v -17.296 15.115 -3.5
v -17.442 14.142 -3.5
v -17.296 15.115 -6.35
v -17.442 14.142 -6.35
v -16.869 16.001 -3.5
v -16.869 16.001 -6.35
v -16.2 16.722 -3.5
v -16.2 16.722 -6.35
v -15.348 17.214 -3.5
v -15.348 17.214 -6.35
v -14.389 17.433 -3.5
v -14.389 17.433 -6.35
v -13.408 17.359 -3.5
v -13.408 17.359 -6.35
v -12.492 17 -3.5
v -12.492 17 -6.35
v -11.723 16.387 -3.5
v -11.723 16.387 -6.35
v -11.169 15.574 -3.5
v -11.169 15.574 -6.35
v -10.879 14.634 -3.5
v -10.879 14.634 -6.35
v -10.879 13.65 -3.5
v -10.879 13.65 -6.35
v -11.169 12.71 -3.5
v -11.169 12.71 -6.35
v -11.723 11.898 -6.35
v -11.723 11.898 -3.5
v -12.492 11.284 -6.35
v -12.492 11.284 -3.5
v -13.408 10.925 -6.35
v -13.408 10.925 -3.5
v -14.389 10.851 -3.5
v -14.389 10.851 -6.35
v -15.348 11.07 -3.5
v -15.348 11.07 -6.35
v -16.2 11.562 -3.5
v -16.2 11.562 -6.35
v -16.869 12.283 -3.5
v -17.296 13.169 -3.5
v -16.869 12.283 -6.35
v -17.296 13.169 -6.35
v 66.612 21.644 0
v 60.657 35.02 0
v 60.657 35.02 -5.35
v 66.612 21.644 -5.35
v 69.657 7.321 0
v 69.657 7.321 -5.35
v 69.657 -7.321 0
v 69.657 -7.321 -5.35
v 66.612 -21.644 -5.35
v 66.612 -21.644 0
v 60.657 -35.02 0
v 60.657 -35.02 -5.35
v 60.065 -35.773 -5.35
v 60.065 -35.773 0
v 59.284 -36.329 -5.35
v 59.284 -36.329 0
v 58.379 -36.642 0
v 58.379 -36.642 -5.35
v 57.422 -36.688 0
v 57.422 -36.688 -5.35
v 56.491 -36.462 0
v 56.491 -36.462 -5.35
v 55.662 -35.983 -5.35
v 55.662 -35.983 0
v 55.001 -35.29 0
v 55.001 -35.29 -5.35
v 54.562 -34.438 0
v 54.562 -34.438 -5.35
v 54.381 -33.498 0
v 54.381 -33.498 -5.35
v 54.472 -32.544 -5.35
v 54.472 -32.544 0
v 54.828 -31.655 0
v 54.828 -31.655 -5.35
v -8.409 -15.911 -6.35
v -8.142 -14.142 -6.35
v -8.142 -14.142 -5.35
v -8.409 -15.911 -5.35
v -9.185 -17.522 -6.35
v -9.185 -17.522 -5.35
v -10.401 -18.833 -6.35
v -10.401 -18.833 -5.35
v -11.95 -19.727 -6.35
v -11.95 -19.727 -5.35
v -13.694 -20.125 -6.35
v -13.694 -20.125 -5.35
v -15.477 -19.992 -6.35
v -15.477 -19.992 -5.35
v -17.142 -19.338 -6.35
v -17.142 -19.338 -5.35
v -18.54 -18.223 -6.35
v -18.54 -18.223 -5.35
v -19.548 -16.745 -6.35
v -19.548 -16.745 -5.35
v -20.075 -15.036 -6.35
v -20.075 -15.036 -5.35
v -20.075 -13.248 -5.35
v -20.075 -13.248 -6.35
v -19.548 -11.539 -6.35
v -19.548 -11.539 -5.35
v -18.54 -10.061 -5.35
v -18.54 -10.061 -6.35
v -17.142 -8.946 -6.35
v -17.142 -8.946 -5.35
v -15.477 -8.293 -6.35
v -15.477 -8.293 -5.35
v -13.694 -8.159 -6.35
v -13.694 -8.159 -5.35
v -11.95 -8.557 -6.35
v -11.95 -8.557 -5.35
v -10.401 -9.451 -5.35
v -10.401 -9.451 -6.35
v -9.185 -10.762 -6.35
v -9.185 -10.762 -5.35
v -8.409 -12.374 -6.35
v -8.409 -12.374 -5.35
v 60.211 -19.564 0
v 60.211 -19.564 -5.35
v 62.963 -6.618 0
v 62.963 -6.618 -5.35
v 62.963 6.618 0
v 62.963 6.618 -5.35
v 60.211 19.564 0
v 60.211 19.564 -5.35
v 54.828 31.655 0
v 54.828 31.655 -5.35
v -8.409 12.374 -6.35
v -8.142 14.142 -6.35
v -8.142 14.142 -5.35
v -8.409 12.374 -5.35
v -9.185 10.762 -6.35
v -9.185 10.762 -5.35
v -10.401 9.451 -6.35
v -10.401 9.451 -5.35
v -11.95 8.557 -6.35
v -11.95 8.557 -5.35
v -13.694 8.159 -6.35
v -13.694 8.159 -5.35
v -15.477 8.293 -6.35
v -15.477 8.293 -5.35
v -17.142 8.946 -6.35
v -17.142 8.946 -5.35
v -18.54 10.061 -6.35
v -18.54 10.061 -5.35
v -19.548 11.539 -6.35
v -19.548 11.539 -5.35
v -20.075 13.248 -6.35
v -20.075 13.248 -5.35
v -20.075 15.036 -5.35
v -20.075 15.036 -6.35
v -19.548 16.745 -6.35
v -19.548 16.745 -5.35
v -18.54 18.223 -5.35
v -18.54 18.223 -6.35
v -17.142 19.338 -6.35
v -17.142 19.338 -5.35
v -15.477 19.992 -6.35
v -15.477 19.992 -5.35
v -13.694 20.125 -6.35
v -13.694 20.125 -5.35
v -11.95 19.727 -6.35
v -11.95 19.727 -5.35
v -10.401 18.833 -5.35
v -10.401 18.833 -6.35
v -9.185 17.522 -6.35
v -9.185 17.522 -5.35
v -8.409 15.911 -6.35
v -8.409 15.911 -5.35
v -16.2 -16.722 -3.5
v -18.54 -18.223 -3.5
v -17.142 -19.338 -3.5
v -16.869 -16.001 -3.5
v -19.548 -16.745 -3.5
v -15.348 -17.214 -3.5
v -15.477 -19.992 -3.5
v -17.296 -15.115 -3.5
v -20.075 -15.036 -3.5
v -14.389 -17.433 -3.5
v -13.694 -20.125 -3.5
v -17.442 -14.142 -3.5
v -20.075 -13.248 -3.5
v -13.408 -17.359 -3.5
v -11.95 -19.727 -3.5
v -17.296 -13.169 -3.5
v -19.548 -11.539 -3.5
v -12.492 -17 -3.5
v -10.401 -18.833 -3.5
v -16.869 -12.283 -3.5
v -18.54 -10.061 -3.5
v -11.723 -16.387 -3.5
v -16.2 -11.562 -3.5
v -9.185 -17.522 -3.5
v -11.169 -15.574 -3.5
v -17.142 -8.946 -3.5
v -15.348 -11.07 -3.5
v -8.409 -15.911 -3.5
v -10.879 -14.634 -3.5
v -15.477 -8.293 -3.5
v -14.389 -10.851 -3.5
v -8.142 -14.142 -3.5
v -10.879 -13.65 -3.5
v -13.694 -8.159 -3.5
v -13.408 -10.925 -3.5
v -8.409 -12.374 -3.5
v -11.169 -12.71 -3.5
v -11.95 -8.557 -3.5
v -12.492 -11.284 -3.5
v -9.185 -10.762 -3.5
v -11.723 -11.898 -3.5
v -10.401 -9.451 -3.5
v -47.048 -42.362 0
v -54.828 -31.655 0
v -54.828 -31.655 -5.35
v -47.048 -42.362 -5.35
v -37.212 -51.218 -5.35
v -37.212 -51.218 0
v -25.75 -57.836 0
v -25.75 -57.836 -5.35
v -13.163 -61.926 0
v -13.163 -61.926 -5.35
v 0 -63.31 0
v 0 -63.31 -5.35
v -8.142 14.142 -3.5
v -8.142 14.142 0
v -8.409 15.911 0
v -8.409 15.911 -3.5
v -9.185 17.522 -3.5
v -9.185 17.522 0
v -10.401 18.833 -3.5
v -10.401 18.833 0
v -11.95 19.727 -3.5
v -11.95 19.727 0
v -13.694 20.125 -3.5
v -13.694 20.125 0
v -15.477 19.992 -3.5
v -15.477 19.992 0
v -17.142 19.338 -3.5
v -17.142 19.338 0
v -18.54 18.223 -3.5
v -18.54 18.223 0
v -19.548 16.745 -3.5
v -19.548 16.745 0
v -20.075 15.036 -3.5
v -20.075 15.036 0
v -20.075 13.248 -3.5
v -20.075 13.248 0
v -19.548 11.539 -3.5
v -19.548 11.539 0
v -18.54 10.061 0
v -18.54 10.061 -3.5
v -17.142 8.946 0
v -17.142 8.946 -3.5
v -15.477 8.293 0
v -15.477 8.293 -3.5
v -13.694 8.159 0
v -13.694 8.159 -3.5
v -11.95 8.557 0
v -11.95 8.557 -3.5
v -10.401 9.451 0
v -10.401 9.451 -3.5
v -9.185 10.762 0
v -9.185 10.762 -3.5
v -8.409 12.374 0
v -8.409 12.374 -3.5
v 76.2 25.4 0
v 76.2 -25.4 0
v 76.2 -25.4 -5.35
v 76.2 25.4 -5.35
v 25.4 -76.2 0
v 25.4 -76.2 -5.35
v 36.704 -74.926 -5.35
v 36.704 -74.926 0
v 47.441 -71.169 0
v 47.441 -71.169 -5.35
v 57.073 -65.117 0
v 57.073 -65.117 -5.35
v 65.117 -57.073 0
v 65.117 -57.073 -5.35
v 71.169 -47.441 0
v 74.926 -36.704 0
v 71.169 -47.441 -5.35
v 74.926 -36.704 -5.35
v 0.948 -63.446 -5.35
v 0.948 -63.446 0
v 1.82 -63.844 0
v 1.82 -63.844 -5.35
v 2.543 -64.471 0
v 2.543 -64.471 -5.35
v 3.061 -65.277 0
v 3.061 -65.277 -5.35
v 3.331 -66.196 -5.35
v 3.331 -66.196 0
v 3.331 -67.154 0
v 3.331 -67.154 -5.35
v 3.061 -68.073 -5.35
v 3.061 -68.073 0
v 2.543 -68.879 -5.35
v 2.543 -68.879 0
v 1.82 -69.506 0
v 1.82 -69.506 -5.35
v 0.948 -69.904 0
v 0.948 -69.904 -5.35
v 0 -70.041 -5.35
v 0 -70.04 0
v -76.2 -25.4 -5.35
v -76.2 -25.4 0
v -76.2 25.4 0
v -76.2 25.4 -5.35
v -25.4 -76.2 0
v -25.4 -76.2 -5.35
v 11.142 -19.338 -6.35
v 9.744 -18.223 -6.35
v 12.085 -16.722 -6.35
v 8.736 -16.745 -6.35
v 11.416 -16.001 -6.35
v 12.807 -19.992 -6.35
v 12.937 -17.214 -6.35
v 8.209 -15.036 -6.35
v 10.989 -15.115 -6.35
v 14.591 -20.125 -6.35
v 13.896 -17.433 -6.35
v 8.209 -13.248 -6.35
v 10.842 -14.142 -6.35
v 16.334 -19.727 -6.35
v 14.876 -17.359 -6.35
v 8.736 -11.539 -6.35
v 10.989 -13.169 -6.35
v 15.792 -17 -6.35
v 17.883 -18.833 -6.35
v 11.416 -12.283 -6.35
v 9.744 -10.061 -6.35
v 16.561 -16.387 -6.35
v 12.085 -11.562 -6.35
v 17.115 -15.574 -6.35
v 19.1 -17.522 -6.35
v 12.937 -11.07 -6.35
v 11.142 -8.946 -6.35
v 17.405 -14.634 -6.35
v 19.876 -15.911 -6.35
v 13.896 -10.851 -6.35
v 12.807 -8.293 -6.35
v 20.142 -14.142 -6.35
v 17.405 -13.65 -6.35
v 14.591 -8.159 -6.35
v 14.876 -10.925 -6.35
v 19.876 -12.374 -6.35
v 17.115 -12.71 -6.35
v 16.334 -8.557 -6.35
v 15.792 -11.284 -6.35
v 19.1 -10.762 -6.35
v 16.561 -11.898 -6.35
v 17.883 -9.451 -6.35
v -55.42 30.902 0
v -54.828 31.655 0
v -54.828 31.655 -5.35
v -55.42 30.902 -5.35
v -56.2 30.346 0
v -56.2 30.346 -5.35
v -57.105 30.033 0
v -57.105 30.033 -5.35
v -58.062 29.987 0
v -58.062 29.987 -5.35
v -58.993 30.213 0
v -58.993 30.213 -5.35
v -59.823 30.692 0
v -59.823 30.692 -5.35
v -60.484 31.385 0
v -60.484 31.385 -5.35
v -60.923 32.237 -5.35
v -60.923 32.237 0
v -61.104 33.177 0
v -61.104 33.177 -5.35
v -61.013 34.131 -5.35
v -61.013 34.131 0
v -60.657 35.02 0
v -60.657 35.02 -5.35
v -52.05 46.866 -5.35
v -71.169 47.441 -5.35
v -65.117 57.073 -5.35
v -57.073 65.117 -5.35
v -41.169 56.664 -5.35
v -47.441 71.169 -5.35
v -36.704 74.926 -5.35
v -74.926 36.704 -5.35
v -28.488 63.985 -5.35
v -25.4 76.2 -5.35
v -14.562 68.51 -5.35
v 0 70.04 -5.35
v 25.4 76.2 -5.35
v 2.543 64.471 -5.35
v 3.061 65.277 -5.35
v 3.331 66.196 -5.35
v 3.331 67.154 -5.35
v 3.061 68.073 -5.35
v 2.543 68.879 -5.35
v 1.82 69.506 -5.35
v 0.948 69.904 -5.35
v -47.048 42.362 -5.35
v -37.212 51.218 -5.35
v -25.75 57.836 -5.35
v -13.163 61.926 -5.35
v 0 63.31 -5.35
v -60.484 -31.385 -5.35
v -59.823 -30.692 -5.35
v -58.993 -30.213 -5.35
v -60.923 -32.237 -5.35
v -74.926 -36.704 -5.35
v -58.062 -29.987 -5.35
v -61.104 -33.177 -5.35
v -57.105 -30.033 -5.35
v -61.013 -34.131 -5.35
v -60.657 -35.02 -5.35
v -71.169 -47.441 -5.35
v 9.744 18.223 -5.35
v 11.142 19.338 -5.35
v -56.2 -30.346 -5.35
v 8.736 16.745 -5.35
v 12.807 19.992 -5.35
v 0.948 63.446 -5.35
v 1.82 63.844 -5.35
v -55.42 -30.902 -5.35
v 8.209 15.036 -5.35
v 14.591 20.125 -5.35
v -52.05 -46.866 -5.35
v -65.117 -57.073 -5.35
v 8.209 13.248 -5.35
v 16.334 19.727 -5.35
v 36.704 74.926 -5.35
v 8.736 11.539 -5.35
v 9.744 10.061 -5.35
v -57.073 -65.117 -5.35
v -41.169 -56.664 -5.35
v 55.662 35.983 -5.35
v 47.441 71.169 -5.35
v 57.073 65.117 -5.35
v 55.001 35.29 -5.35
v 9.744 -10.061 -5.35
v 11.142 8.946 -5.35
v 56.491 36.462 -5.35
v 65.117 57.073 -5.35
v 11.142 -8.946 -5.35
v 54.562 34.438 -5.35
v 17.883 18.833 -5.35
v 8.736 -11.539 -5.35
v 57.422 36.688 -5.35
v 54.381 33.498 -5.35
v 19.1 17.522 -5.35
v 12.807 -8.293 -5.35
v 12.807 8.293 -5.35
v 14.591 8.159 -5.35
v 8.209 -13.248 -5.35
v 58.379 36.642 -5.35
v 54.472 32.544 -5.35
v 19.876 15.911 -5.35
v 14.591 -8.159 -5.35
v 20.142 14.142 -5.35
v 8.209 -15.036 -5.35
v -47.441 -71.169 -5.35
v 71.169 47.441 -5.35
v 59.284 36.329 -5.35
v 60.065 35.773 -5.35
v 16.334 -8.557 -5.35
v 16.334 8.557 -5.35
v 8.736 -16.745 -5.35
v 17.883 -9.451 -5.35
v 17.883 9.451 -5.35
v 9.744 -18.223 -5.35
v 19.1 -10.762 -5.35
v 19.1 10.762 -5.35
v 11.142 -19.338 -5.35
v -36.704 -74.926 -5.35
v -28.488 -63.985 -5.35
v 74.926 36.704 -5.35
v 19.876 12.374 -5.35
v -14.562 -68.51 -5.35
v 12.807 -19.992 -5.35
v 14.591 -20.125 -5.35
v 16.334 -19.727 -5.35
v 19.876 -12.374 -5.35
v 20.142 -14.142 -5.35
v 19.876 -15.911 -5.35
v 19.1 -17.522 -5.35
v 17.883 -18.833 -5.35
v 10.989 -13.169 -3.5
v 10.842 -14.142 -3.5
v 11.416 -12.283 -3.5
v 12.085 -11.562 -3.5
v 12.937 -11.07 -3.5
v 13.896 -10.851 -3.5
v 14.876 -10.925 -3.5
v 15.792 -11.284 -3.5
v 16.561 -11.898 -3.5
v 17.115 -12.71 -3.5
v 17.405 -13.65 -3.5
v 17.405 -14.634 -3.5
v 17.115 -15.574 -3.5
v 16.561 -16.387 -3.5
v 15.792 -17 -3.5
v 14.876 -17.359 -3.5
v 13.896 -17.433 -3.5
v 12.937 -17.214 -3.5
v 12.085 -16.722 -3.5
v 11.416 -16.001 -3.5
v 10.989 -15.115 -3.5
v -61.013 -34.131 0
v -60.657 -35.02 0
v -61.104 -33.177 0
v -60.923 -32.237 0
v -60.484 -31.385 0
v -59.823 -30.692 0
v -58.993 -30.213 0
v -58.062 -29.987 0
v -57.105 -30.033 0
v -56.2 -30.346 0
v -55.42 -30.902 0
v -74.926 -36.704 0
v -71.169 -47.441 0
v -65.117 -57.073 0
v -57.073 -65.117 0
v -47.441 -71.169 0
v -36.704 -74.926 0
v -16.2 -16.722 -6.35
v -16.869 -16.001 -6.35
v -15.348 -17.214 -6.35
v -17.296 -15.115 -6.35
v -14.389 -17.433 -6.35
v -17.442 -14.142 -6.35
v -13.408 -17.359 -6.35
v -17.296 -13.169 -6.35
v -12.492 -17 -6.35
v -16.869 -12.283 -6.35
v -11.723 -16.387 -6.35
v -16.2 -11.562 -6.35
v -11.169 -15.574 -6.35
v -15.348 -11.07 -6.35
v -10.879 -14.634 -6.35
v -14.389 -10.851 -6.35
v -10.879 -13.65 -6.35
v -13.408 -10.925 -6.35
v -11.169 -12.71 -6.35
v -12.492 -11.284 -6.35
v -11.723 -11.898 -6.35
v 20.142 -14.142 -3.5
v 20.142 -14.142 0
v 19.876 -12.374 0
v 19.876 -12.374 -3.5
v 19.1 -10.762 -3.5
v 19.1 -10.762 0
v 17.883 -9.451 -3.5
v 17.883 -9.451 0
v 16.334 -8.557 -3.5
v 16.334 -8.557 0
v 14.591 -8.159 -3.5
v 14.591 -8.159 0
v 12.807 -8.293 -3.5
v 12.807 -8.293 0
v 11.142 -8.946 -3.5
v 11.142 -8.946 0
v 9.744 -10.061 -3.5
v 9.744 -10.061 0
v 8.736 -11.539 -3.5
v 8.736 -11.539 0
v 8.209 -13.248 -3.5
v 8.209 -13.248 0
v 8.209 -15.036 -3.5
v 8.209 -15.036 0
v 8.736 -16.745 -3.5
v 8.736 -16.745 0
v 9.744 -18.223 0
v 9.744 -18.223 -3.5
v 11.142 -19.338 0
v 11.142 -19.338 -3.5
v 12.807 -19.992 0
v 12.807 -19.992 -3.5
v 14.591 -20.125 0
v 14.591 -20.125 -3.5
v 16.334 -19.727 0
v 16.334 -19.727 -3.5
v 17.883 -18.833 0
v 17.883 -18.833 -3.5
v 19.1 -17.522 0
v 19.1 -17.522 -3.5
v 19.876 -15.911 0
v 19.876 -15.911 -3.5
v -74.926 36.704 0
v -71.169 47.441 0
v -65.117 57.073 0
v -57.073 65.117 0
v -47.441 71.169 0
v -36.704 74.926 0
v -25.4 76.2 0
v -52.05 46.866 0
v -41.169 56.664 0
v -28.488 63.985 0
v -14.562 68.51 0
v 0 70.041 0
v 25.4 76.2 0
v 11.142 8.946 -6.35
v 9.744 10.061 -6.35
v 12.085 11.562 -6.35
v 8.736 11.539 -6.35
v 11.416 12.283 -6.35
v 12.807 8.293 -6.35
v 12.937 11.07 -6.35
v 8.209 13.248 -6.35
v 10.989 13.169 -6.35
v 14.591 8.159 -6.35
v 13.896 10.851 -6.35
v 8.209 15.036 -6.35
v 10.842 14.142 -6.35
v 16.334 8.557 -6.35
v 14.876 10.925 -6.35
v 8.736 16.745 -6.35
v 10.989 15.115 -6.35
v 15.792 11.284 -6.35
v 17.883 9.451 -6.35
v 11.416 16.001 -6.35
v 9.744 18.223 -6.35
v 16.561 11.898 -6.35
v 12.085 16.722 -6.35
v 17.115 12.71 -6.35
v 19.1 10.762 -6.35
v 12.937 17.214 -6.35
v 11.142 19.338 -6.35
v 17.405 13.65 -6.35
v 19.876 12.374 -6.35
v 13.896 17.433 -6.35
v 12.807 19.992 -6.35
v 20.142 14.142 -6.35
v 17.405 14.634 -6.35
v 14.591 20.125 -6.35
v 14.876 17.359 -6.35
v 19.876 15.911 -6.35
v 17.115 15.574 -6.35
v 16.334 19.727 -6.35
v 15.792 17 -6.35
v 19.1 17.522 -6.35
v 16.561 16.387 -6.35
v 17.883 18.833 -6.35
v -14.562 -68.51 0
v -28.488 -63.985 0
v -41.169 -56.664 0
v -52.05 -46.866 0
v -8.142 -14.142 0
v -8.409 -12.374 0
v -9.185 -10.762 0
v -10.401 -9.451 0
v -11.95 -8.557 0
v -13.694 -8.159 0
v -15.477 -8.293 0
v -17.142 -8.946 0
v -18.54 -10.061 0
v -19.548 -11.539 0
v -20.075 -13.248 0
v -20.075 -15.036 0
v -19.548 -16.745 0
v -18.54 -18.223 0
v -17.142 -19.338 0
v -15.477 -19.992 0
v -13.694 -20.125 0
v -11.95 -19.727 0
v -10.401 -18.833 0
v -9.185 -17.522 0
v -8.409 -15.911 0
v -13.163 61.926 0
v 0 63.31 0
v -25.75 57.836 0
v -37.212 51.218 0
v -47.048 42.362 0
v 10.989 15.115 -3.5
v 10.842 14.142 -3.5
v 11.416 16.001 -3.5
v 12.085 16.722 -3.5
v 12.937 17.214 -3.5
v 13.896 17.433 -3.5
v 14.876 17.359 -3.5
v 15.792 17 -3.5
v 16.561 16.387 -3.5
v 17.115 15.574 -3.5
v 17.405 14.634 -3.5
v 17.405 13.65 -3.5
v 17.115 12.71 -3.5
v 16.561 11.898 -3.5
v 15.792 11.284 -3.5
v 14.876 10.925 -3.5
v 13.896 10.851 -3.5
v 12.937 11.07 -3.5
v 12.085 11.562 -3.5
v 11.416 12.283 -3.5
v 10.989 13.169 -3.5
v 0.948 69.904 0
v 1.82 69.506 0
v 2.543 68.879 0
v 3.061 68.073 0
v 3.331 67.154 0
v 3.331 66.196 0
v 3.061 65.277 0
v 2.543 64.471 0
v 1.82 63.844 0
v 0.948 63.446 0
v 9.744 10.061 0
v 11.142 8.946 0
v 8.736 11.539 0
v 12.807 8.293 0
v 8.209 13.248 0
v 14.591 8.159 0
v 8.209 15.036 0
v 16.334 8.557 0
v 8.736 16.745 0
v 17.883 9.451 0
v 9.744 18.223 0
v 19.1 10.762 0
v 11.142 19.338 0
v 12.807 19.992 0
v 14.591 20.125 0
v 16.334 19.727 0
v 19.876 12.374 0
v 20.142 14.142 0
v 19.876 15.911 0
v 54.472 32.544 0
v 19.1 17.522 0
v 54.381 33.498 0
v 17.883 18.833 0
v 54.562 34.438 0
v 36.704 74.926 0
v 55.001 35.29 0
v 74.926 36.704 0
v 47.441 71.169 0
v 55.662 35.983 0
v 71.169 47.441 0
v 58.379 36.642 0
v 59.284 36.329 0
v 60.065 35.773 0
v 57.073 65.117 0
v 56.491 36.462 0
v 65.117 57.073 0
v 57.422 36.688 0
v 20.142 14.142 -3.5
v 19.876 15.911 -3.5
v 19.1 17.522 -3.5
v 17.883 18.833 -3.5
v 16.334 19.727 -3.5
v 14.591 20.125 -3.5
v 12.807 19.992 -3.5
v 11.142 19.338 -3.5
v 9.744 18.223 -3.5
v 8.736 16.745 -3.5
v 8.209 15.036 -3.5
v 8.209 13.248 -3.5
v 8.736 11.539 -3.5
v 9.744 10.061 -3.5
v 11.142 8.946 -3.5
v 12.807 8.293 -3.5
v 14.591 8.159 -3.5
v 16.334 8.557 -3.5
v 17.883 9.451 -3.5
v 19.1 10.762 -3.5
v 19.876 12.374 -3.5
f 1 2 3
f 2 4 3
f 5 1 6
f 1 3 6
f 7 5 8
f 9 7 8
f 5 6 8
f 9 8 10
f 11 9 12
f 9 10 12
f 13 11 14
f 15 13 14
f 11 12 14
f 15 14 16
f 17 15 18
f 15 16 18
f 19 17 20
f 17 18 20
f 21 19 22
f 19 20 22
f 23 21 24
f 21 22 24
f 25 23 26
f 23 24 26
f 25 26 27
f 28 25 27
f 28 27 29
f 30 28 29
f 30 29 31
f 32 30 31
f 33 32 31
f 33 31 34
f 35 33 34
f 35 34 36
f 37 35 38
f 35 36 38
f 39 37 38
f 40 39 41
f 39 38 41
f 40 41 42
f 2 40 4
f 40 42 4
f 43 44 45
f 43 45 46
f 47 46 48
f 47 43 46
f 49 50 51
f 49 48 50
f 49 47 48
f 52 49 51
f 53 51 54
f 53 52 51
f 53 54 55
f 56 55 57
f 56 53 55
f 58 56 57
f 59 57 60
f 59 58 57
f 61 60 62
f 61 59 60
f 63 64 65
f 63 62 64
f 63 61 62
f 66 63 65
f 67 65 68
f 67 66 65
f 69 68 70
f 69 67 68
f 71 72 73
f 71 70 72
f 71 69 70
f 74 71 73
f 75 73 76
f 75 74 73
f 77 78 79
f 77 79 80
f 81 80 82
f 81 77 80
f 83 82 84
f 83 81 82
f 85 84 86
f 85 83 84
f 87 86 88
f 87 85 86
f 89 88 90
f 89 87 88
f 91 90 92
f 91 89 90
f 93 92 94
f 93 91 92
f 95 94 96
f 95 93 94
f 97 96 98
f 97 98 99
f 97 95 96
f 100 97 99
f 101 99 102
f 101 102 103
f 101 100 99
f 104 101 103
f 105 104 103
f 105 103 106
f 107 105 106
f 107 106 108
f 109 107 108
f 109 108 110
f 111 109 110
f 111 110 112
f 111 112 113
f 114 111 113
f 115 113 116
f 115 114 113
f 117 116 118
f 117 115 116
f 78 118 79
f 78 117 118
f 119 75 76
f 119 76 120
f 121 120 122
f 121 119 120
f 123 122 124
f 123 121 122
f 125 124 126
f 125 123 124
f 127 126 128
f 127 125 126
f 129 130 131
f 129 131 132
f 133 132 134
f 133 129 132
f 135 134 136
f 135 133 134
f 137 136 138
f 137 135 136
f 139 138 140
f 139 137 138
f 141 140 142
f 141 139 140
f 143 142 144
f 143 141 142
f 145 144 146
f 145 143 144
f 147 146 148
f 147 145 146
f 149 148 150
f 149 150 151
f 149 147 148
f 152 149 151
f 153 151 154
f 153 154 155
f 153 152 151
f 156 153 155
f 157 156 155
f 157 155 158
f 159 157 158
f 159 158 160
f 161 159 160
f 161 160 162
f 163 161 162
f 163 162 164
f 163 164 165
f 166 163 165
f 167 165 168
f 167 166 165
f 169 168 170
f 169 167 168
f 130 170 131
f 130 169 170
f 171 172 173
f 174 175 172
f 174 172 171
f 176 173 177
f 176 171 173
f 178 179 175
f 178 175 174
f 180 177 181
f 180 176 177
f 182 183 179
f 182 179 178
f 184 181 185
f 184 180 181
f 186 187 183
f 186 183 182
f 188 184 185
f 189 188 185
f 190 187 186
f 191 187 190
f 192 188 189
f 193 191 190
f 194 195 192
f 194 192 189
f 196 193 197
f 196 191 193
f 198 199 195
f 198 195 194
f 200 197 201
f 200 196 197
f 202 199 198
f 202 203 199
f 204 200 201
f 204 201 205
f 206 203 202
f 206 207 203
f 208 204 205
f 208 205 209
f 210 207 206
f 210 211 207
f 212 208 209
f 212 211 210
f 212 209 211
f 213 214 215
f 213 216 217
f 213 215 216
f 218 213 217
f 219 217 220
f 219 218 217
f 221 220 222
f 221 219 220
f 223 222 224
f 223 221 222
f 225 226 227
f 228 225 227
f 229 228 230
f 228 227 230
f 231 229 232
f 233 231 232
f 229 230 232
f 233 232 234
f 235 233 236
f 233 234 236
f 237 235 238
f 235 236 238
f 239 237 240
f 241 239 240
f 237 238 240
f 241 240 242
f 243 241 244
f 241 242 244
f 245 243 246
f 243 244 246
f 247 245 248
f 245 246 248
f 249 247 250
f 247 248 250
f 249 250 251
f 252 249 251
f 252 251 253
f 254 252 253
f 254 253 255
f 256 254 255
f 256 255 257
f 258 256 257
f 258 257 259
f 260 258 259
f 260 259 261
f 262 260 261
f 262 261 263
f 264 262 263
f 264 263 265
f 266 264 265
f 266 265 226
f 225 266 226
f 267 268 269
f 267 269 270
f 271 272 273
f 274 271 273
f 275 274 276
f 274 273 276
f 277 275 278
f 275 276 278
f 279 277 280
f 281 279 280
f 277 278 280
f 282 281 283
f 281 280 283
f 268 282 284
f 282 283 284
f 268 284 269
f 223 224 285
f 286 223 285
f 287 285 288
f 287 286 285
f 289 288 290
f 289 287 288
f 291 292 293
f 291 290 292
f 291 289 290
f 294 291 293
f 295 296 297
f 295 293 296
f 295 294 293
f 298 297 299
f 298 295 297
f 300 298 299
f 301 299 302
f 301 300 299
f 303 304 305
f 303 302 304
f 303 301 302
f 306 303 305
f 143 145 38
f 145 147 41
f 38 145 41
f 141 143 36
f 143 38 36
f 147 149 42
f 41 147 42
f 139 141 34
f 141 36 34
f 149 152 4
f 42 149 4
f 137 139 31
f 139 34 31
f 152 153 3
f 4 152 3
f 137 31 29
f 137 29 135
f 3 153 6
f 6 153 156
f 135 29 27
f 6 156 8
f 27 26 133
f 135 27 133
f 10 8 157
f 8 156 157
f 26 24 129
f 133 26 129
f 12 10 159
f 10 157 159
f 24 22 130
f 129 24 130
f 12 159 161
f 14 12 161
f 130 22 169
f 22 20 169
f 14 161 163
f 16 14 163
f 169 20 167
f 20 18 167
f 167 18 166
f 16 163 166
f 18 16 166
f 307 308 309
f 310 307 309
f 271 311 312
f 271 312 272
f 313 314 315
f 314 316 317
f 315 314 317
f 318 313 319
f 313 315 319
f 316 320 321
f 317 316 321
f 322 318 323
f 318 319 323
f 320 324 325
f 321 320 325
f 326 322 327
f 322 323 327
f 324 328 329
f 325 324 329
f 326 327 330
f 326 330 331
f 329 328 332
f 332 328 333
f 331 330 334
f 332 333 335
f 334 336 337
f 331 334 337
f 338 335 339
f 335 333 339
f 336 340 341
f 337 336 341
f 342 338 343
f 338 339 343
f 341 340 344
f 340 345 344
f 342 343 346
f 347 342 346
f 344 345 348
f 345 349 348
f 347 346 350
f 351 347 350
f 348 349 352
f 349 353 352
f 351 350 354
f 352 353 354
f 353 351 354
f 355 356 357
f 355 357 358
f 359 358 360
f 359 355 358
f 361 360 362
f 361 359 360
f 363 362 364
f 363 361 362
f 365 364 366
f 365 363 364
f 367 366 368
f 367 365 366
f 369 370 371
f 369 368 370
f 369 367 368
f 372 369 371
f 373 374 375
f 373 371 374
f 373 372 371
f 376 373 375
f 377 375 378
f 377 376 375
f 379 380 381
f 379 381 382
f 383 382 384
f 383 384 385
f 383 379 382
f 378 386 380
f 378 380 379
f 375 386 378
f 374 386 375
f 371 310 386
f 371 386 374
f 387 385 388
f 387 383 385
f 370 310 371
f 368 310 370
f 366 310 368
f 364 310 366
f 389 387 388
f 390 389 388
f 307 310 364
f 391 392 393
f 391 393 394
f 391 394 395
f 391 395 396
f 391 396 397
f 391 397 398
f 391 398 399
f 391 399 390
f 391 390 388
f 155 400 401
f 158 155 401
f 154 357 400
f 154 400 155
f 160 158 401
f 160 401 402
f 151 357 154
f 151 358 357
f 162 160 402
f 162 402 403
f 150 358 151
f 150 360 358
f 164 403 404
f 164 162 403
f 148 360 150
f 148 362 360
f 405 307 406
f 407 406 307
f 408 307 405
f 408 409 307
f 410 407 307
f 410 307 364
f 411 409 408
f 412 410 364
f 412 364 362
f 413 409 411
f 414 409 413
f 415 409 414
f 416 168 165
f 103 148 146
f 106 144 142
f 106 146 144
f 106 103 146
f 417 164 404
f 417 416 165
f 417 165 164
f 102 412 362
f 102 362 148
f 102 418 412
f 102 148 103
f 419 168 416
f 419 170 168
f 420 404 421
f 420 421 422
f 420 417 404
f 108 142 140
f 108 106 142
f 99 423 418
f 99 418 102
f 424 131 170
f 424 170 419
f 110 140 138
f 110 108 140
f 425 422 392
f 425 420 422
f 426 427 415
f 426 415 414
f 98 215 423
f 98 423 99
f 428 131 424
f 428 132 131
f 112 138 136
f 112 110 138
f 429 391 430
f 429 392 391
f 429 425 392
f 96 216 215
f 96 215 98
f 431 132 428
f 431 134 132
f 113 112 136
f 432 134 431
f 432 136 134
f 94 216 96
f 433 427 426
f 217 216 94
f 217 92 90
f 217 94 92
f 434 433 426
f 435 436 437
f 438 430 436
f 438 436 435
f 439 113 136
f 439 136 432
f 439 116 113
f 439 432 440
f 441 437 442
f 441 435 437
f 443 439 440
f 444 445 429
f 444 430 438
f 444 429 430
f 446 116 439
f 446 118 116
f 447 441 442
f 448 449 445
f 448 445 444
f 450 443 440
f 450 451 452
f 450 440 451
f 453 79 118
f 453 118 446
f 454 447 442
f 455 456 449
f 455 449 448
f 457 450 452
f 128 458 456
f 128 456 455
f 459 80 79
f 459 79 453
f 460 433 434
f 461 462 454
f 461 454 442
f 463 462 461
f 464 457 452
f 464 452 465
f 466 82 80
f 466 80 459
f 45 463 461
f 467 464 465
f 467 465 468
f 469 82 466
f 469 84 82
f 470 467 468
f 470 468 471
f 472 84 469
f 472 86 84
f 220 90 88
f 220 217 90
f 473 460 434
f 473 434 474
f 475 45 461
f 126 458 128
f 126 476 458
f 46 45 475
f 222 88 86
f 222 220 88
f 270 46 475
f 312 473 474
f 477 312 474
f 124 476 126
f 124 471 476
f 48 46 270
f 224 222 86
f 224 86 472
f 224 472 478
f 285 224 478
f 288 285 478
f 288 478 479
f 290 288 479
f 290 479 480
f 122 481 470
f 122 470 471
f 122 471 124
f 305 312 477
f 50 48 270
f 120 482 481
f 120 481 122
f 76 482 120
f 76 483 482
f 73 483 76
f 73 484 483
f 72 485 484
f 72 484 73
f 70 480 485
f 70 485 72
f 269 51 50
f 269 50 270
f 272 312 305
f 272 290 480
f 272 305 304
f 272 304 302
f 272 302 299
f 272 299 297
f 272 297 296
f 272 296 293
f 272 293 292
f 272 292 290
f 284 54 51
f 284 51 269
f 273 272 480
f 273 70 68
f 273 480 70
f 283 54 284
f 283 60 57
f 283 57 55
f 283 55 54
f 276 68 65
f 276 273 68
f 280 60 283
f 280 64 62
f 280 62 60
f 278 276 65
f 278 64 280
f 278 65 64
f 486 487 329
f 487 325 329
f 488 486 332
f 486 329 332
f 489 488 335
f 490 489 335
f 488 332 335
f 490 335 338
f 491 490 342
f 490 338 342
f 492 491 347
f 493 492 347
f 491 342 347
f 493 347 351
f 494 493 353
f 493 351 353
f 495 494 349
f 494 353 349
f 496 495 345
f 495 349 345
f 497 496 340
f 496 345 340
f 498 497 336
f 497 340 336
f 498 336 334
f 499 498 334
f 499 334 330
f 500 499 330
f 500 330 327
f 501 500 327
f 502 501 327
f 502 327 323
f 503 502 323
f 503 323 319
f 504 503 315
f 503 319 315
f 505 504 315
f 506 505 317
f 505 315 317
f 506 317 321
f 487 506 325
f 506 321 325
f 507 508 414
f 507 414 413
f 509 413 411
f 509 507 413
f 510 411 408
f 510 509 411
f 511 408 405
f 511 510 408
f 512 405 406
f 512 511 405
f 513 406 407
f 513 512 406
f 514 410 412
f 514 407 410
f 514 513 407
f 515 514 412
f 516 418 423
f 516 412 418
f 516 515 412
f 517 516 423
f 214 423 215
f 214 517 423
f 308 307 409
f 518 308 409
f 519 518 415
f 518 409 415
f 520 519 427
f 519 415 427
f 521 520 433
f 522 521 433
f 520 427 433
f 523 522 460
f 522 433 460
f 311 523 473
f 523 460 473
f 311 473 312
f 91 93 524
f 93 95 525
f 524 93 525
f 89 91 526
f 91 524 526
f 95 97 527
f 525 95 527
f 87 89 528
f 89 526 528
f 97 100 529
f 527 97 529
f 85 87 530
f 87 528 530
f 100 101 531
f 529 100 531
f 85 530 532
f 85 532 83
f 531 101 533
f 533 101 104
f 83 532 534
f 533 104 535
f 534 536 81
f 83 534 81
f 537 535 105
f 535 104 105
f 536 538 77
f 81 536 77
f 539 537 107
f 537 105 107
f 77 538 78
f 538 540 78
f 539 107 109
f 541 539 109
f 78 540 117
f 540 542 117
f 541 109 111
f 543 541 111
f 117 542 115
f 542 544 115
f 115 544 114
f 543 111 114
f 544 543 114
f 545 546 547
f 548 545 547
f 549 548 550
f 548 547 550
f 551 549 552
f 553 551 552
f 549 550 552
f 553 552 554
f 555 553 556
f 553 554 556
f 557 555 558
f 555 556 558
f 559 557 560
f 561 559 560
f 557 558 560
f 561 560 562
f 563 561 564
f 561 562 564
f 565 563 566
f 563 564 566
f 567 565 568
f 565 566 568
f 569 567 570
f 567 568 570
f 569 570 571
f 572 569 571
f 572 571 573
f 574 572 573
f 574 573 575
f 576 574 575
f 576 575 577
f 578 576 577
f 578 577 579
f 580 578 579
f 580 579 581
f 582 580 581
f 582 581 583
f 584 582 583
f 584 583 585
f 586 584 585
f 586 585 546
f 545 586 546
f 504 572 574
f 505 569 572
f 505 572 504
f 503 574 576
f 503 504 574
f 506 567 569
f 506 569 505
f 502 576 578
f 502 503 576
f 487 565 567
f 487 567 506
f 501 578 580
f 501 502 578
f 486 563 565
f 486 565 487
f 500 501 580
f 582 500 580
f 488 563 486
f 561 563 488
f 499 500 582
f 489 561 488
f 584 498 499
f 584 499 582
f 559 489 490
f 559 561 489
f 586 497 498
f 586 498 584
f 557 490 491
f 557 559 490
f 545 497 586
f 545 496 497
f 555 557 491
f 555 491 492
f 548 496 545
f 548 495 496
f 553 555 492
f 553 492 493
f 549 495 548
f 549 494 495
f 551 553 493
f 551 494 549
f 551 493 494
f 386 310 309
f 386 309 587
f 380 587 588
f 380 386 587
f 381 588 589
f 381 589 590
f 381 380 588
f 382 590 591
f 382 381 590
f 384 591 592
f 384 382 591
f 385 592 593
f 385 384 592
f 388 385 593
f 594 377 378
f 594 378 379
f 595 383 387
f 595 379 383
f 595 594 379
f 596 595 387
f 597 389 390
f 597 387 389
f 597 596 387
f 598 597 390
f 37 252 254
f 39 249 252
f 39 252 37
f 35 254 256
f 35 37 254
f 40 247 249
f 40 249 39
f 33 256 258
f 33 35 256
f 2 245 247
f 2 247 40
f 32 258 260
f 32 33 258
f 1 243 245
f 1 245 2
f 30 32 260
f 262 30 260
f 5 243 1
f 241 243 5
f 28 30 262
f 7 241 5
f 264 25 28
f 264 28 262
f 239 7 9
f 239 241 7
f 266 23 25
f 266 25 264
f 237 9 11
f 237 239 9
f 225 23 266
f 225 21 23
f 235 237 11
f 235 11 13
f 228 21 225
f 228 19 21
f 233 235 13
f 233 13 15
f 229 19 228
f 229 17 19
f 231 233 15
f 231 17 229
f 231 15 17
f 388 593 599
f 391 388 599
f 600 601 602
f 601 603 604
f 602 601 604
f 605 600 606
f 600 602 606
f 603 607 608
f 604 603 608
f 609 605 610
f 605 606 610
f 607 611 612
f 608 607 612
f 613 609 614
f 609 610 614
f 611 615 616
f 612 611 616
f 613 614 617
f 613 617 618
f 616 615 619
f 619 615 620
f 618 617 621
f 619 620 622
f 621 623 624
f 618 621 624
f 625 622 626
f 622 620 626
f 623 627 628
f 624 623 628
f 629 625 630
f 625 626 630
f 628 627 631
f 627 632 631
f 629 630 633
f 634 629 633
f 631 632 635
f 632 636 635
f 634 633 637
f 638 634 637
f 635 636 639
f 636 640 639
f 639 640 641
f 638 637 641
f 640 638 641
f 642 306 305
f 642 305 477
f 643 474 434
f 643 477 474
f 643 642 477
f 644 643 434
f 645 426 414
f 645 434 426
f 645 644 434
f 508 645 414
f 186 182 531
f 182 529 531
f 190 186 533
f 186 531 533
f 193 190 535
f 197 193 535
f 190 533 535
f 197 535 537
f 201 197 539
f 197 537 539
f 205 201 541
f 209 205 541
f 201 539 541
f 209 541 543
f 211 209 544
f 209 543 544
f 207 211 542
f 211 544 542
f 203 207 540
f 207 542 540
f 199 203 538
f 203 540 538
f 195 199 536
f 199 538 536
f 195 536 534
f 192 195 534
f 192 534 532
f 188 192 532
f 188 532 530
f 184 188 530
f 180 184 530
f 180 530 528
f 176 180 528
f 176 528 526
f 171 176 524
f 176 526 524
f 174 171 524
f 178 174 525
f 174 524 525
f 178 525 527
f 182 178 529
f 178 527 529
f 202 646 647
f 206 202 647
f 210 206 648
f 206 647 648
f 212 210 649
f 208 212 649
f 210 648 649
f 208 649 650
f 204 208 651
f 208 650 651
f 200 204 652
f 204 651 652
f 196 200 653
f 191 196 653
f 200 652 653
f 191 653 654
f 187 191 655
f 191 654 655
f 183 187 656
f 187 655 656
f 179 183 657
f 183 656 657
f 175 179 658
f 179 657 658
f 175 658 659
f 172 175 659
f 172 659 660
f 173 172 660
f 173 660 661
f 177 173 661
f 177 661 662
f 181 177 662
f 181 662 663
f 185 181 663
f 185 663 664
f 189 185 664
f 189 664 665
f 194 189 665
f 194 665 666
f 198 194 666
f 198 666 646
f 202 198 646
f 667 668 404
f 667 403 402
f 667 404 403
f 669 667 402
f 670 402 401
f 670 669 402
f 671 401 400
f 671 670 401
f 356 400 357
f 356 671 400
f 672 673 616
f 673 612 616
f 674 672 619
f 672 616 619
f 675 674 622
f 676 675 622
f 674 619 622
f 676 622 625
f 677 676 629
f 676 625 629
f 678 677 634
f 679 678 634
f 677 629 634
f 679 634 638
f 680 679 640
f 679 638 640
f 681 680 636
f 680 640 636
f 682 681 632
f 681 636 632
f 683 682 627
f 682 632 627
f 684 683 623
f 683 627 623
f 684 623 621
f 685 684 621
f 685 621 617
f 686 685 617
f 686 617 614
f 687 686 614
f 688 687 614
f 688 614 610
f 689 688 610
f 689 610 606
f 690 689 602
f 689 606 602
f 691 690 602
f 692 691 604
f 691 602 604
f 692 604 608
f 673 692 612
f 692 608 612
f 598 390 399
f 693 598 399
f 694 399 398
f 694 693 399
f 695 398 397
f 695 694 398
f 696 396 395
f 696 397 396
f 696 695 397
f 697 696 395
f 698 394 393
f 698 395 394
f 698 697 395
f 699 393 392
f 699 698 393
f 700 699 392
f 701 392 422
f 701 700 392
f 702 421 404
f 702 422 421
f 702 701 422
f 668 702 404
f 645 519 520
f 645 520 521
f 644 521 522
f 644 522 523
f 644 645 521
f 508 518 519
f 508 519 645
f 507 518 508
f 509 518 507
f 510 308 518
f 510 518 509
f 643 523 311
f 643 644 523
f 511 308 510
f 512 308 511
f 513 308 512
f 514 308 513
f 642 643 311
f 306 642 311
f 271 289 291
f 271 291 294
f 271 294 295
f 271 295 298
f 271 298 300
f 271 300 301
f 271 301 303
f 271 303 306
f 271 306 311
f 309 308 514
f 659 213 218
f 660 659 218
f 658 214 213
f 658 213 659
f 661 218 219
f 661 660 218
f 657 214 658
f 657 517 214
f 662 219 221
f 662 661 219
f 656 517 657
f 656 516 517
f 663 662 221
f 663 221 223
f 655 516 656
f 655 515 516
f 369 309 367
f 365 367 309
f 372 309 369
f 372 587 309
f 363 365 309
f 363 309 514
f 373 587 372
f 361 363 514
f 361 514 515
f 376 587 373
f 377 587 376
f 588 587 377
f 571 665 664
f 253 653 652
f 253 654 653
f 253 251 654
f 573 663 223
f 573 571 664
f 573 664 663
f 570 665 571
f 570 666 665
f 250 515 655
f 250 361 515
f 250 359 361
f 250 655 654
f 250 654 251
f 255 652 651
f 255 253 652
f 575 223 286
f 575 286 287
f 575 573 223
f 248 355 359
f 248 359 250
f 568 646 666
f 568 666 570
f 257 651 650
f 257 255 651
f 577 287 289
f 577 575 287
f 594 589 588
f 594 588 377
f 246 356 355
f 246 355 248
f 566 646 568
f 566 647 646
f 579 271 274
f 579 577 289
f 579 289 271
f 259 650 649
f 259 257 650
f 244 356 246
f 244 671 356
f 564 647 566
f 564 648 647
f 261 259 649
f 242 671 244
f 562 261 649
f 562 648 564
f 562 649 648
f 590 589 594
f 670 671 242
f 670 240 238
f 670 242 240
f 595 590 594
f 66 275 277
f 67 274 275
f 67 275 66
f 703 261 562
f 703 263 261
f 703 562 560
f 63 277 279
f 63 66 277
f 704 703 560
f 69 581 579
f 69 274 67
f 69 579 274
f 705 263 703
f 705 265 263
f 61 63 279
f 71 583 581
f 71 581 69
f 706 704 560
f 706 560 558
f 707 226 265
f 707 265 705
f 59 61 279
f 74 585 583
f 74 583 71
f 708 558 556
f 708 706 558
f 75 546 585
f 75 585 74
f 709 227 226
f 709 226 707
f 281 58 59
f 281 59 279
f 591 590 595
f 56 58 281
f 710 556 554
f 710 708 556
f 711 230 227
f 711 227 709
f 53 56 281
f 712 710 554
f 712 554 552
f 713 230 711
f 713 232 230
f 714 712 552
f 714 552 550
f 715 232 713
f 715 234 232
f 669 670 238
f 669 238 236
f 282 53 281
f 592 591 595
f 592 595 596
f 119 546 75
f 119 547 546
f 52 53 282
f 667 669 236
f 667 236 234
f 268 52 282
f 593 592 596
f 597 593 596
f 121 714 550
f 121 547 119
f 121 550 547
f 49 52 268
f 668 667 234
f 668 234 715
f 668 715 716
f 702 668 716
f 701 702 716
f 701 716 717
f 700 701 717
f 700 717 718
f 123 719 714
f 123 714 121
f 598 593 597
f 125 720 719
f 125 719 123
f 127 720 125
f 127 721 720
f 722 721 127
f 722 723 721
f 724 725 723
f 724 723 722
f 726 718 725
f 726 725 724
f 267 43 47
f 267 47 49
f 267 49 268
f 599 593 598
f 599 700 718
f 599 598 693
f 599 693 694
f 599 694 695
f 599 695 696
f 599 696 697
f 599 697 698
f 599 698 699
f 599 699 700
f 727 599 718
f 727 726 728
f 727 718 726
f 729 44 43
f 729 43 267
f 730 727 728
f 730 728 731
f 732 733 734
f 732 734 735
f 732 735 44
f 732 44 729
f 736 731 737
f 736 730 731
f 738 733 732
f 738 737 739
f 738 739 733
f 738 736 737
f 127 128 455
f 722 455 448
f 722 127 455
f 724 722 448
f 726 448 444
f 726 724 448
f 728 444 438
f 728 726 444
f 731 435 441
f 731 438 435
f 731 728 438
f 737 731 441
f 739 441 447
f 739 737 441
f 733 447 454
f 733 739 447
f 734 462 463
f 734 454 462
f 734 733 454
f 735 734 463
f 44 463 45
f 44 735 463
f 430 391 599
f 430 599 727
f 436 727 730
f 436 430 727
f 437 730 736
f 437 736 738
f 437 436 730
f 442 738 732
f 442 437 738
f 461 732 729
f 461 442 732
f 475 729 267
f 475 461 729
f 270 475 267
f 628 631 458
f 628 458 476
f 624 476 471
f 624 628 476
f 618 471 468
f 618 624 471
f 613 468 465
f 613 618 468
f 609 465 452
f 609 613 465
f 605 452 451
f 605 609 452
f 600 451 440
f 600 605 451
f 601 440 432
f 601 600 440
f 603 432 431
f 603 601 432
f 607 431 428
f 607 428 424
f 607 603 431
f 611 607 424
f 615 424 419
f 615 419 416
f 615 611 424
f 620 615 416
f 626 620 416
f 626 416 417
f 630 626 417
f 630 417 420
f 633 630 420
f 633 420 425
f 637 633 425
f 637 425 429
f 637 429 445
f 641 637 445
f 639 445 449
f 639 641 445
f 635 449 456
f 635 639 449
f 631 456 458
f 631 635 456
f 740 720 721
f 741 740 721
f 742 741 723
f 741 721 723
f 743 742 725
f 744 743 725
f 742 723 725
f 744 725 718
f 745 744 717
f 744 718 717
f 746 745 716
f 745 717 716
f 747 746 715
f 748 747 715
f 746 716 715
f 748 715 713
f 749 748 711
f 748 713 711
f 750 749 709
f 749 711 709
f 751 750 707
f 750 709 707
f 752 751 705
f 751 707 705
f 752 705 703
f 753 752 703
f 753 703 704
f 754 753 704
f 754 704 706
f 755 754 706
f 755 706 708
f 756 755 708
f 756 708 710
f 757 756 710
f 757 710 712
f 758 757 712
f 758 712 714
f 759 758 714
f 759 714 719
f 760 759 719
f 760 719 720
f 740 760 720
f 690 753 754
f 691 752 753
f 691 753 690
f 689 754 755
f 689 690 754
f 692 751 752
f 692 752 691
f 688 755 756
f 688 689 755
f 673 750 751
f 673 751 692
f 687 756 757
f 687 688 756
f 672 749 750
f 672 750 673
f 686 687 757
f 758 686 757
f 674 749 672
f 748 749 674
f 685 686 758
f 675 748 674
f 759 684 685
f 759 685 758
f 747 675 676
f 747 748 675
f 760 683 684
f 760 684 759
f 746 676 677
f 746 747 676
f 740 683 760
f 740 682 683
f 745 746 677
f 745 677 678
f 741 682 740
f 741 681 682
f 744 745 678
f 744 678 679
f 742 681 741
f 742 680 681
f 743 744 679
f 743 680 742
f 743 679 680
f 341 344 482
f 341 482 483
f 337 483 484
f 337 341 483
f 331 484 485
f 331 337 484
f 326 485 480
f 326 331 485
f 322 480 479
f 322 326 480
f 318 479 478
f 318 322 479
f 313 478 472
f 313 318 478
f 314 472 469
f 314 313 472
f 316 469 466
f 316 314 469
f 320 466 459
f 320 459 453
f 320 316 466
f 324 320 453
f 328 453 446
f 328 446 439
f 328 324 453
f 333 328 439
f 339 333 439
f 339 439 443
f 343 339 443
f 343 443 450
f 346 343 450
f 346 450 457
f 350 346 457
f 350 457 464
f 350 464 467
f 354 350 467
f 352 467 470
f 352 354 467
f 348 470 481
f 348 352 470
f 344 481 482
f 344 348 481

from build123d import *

# Parameters (mm, degrees)
F0_W           = 152.4
F0_H           = 152.4
F0_W_2         = 28.2842712475
F0_H_2         = 28.2842712475
F1_DEPTH       = 6.35
F2_D           = 6.6
F2_CBORE_D     = 12
F2_CBORE_DEPTH = 3.5
F3_R           = 50.8
F4_R           = 6
F5_DEPTH       = 1


with BuildPart() as f1:
    # F0 (on Top) → F1 (new body)
    with BuildSketch(Plane.XY):
        Rectangle(F0_W, F0_H)
        with BuildLine():
            ThreePointArc((0, -63.3095), (3.3655, -66.675), (0, -70.0405))
            ThreePointArc((0, -70.0405), (-35.02025, -60.6568522938), (-60.6568522938, -35.02025))
            ThreePointArc((-60.6568522938, -35.02025), (-59.4249937973, -30.4228915036), (-54.8276353009, -31.65475))
            ThreePointArc((-54.8276353009, -31.65475), (-31.65475, -54.8276353009), (0, -63.3095))
        make_face(mode=Mode.SUBTRACT)
        with BuildLine():
            ThreePointArc((-54.8276353009, 31.65475), (-59.4249937973, 30.4228915036), (-60.6568522938, 35.02025))
            ThreePointArc((-60.6568522938, 35.02025), (-35.02025, 60.6568522938), (0, 70.0405))
            ThreePointArc((0, 70.0405), (3.3655, 66.675), (0, 63.3095))
            ThreePointArc((0, 63.3095), (-31.65475, 54.8276353009), (-54.8276353009, 31.65475))
        make_face(mode=Mode.SUBTRACT)
        Rectangle(F0_W_2, F0_H_2, mode=Mode.SUBTRACT)
        with BuildLine():
            ThreePointArc((54.8276353009, 31.65475), (56.0594937973, 36.2521084964), (60.6568522938, 35.02025))
            ThreePointArc((60.6568522938, 35.02025), (70.0405, 0), (60.6568522938, -35.02025))
            ThreePointArc((60.6568522938, -35.02025), (56.0594937973, -36.2521084964), (54.8276353009, -31.65475))
            ThreePointArc((54.8276353009, -31.65475), (63.3095, 0), (54.8276353009, 31.65475))
        make_face(mode=Mode.SUBTRACT)
        Rectangle(F0_W_2, F0_H_2)
    extrude(amount=-F1_DEPTH)

    # F2 (through all)
    with Locations(Plane.XY):
        with Locations((14.1421356237, 14.1421356237), (14.1421356237, -14.1421356237), (-14.1421356237, -14.1421356237), (-14.1421356237, 14.1421356237)):
            CounterBoreHole(F2_D / 2, F2_CBORE_D / 2, F2_CBORE_DEPTH)

    # F3
    f3_edges = [f1.edges().sort_by_distance(p)[0] for p in [
        (76.2, -76.2, -3.175),
        (-76.2, -76.2, -3.175),
        (76.2, 76.2, -3.175),
        (-76.2, 76.2, -3.175),
    ]]
    fillet(f3_edges, radius=F3_R)

    # F4 (on face) → F5 (cut)
    with BuildSketch(Plane(origin=(0, 0, -6.35), x_dir=(1, 0, 0), z_dir=(0, 0, -1))):
        with BuildLine():
            ThreePointArc((-76.2, -25.4), (-61.3210244843, -61.3210244843), (-25.4, -76.2))
            Line((-25.4, -76.2), (25.4, -76.2))
            ThreePointArc((25.4, -76.2), (61.3210244843, -61.3210244843), (76.2, -25.4))
            Line((76.2, -25.4), (76.2, 25.4))
            ThreePointArc((76.2, 25.4), (61.3210244843, 61.3210244843), (25.4, 76.2))
            Line((25.4, 76.2), (-25.4, 76.2))
            ThreePointArc((-25.4, 76.2), (-61.3210244843, 61.3210244843), (-76.2, 25.4))
            Line((-76.2, 25.4), (-76.2, -25.4))
        make_face()
        with BuildLine():
            ThreePointArc((-54.8276353009, -31.65475), (-31.65475, -54.8276353009), (0, -63.3095))
            ThreePointArc((0, -63.3095), (3.3655, -66.675), (0, -70.0405))
            ThreePointArc((0, -70.0405), (-35.02025, -60.6568522938), (-60.6568522938, -35.02025))
            ThreePointArc((-60.6568522938, -35.02025), (-59.4249937973, -30.4228915036), (-54.8276353009, -31.65475))
        make_face(mode=Mode.SUBTRACT)
        with Locations((-14.1421356237, -14.1421356237)):
            Circle(F4_R, mode=Mode.SUBTRACT)
        with Locations((14.1421356237, -14.1421356237)):
            Circle(F4_R, mode=Mode.SUBTRACT)
        with BuildLine():
            ThreePointArc((60.6568522938, -35.02025), (56.0594937973, -36.2521084964), (54.8276353009, -31.65475))
            ThreePointArc((54.8276353009, -31.65475), (63.3095, 0), (54.8276353009, 31.65475))
            ThreePointArc((54.8276353009, 31.65475), (56.0594937973, 36.2521084964), (60.6568522938, 35.02025))
            ThreePointArc((60.6568522938, 35.02025), (70.0405, 0), (60.6568522938, -35.02025))
        make_face(mode=Mode.SUBTRACT)
        with Locations((-14.1421356237, 14.1421356237)):
            Circle(F4_R, mode=Mode.SUBTRACT)
        with BuildLine():
            ThreePointArc((-54.8276353009, 31.65475), (-59.4249937973, 30.4228915036), (-60.6568522938, 35.02025))
            ThreePointArc((-60.6568522938, 35.02025), (-35.02025, 60.6568522938), (0, 70.0405))
            ThreePointArc((0, 70.0405), (3.3655, 66.675), (0, 63.3095))
            ThreePointArc((0, 63.3095), (-31.65475, 54.8276353009), (-54.8276353009, 31.65475))
        make_face(mode=Mode.SUBTRACT)
        with Locations((14.1421356237, 14.1421356237)):
            Circle(F4_R, mode=Mode.SUBTRACT)
    extrude(amount=-F5_DEPTH, mode=Mode.SUBTRACT)


solid = f1.part
